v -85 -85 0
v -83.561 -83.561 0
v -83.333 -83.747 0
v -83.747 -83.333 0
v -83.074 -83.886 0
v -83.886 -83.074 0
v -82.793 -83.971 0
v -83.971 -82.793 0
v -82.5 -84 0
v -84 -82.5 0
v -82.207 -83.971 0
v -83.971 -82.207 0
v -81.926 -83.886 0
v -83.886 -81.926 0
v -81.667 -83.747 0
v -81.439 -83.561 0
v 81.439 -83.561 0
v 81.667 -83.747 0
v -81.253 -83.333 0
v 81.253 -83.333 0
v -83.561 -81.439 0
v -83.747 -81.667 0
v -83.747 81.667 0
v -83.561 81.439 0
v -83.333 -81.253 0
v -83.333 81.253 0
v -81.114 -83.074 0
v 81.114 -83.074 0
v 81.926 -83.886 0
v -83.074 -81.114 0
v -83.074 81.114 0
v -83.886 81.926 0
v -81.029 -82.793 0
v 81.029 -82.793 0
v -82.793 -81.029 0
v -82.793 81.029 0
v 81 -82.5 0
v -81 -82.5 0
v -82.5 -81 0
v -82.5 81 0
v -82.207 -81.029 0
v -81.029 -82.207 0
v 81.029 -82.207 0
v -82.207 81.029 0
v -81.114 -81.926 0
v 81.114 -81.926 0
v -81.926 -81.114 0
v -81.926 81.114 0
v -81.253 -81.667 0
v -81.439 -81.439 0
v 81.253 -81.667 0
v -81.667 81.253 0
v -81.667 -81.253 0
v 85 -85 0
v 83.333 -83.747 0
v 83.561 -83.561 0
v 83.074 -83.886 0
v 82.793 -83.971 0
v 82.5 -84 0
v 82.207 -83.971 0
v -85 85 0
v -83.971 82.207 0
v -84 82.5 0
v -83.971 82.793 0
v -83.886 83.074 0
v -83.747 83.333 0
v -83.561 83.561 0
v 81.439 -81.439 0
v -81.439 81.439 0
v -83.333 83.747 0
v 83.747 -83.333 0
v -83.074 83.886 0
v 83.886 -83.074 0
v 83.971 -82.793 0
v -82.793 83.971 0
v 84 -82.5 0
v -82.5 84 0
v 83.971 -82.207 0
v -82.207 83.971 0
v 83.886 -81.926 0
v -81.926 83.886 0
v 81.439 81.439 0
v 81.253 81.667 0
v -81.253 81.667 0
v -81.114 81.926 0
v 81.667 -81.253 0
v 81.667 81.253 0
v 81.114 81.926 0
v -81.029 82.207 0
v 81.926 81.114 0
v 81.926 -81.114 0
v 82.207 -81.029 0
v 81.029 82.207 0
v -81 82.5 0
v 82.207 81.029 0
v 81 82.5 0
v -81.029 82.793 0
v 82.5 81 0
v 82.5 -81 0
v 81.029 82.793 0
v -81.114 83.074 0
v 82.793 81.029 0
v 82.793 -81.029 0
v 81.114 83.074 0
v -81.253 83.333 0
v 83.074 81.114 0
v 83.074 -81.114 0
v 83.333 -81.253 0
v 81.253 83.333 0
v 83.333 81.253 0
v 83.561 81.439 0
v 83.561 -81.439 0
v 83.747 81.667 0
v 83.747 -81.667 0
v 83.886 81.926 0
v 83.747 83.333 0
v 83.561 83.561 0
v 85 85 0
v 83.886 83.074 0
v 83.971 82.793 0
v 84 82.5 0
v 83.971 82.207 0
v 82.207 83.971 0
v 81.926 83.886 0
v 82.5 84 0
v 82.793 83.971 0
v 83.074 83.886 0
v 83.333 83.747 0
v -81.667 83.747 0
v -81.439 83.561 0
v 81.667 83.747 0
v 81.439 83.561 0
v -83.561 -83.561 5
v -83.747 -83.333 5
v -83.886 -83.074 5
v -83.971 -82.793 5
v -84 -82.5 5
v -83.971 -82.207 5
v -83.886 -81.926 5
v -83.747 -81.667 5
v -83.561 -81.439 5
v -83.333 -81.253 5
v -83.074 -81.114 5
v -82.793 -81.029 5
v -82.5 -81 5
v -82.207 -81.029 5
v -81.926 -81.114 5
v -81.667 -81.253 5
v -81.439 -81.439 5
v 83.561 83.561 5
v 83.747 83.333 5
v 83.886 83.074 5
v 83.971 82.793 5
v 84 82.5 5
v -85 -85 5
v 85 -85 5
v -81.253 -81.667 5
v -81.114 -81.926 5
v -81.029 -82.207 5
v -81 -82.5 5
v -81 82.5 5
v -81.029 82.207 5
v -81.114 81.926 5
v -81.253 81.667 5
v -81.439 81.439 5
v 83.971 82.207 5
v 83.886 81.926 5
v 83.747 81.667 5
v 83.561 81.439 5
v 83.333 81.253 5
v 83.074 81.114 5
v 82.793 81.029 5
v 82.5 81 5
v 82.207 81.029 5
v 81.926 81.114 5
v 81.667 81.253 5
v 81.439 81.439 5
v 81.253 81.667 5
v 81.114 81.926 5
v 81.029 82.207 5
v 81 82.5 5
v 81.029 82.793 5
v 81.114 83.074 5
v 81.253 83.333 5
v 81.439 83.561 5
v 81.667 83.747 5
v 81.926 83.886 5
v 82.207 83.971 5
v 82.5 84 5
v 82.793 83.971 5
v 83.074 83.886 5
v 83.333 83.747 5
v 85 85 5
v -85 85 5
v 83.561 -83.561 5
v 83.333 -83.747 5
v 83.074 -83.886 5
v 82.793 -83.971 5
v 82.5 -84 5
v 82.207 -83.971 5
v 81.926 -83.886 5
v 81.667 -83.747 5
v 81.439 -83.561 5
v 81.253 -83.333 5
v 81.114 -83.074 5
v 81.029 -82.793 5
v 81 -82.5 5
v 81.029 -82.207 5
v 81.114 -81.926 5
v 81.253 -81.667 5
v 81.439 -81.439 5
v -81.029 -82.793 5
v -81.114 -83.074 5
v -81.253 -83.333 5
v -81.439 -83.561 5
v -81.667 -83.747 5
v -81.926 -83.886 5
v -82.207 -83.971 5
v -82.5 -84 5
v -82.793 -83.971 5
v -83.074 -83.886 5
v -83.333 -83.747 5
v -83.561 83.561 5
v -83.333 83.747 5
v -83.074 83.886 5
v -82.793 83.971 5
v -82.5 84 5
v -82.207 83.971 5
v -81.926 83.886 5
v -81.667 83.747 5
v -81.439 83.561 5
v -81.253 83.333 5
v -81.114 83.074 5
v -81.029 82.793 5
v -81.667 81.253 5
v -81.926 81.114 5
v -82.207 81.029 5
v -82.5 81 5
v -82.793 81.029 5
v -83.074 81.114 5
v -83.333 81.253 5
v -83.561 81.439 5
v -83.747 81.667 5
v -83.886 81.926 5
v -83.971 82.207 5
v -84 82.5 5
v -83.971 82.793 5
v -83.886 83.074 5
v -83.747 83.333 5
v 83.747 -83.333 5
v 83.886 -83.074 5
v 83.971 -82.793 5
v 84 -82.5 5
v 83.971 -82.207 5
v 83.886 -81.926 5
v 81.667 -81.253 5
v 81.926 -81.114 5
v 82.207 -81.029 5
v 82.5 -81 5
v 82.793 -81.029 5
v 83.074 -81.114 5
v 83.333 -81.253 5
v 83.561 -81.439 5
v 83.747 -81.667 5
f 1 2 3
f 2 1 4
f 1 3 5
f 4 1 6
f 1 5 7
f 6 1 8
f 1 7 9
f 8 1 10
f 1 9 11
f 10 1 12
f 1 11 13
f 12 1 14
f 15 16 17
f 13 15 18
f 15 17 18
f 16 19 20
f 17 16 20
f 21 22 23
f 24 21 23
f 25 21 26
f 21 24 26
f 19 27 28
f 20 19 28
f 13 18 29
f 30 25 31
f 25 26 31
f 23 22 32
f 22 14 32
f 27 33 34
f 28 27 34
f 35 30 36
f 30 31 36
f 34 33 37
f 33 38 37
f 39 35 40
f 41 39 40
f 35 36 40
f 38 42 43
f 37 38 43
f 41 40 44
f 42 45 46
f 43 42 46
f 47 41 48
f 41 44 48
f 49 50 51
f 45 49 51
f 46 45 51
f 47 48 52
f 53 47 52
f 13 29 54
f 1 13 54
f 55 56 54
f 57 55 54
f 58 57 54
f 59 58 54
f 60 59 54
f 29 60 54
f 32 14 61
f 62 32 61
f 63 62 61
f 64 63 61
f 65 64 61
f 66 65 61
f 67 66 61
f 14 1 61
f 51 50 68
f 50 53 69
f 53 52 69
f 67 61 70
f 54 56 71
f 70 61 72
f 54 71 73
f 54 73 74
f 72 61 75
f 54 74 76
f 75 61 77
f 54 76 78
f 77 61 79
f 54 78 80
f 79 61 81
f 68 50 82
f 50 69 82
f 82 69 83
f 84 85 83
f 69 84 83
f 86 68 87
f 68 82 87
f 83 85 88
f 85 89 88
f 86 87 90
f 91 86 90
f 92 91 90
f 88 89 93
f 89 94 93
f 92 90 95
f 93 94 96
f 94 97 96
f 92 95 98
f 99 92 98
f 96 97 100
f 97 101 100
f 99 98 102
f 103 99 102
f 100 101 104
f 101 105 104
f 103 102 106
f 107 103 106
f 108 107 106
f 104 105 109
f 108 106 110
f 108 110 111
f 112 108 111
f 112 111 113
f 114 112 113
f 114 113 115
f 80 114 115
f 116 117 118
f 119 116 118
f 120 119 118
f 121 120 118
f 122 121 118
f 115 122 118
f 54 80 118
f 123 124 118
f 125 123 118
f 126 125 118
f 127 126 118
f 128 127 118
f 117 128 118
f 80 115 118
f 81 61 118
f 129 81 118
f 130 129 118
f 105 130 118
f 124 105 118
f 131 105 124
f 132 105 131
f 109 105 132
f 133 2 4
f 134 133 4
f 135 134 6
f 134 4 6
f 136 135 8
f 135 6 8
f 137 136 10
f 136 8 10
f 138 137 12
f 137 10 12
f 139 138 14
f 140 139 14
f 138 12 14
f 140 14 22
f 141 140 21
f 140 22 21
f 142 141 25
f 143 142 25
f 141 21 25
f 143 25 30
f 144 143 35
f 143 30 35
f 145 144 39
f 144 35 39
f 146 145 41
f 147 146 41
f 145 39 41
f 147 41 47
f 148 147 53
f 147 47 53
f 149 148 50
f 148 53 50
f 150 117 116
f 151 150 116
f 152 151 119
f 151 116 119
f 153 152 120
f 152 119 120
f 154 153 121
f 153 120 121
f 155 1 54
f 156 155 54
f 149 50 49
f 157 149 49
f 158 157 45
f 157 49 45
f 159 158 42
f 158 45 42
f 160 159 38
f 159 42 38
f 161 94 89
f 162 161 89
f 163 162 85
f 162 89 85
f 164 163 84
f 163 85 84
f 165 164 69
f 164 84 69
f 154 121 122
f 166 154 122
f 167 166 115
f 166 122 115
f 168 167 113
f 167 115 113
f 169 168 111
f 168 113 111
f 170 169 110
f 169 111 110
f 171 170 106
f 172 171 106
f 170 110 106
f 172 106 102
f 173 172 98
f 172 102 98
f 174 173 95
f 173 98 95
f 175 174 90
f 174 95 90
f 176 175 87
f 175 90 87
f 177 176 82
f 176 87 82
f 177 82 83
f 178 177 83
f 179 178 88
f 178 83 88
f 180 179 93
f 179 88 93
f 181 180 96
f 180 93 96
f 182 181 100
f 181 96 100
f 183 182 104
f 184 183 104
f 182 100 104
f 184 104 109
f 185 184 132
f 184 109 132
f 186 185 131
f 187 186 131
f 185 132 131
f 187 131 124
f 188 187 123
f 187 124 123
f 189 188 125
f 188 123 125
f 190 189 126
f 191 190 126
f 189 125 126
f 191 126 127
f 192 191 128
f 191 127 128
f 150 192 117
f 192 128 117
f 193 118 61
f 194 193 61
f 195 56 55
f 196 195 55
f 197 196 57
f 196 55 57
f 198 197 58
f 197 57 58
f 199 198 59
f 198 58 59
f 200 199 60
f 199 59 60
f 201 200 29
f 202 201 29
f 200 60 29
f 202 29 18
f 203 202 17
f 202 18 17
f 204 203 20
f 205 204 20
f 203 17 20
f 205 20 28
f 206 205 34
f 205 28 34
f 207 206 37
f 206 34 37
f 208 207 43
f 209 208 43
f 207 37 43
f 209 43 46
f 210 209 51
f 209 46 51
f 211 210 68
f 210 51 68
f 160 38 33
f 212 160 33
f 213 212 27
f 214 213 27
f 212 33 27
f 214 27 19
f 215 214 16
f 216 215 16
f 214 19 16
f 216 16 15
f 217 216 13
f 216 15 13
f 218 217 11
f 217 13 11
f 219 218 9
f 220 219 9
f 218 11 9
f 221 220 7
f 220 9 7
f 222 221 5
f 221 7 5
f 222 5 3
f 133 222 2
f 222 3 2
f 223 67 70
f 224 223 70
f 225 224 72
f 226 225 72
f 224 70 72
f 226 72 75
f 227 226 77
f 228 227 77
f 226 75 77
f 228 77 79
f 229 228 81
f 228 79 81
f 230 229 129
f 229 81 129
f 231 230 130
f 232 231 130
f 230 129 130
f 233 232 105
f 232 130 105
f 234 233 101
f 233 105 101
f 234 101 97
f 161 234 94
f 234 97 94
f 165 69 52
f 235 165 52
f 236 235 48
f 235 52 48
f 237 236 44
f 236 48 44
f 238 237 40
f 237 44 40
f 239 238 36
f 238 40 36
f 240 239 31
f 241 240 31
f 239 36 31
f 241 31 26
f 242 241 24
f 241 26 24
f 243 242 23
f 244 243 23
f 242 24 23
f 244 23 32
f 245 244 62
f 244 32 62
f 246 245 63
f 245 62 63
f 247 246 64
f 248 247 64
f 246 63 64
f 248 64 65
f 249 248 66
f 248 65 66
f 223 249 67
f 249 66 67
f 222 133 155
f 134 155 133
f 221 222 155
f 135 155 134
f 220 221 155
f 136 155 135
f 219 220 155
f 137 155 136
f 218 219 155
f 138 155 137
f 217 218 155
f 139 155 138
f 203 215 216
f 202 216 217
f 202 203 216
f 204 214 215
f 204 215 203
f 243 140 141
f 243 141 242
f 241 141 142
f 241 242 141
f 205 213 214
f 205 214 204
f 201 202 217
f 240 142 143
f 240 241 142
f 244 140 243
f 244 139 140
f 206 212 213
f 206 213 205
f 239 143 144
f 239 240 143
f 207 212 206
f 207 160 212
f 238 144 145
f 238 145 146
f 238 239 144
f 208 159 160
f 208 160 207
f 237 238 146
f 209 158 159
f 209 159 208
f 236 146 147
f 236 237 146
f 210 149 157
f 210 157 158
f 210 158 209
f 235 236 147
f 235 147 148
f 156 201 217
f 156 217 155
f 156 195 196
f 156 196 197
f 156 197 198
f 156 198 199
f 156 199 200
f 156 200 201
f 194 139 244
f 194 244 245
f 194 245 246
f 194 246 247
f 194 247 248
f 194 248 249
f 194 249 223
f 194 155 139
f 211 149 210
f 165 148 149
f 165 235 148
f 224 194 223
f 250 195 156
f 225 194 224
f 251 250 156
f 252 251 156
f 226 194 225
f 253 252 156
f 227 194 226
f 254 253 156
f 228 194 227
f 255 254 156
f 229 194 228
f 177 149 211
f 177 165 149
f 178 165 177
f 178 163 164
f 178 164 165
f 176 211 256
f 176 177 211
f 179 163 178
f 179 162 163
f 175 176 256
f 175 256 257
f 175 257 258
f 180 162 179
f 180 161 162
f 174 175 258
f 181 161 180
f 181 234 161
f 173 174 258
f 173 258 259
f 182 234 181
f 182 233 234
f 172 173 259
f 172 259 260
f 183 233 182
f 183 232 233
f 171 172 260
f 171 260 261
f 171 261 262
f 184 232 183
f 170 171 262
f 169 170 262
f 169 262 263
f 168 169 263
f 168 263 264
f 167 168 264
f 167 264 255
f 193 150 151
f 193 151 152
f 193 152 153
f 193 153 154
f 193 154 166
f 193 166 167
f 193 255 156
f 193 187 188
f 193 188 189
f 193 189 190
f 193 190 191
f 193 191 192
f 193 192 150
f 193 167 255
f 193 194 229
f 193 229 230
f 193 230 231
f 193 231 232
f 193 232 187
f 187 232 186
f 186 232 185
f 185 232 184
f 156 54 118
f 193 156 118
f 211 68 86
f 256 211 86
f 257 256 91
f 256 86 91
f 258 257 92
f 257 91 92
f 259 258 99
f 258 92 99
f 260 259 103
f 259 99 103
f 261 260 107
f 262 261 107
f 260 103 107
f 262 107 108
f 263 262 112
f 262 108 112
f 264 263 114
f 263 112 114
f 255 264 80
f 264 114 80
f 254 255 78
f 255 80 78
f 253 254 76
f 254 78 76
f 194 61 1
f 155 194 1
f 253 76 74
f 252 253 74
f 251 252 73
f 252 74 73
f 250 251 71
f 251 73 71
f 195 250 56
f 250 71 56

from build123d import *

# Parameters (mm, degrees)
F0_W     = 160.000002
F0_H     = 160.000002
F1_DEPTH = 5


with BuildPart() as f1:
    # F0 (on Top) → F1 (new body)
    with BuildSketch(Plane.XY):
        with BuildLine():
            Line((-85, -85), (85, -85))
            Line((85, -85), (83.56066, -83.56066))
            ThreePointArc((83.56066, -83.56066), (81.43934, -83.56066), (81.43934, -81.43934))
            Line((81.43934, -81.43934), (80.000001, -80.000001))
            Line((80.000001, -80.000001), (-80.000001, -80.000001))
            Line((-80.000001, -80.000001), (-81.43934, -81.43934))
            ThreePointArc((-81.43934, -81.43934), (-81.114181, -81.925975), (-81, -82.5))
            ThreePointArc((-81, -82.5), (-81.925975, -83.88582), (-83.56066, -83.56066))
            Line((-83.56066, -83.56066), (-85, -85))
        make_face()
        with BuildLine():
            Line((-85, 85), (-85, -85))
            Line((-85, -85), (-83.56066, -83.56066))
            ThreePointArc((-83.56066, -83.56066), (-83.56066, -81.43934), (-81.43934, -81.43934))
            Line((-81.43934, -81.43934), (-80.000001, -80.000001))
            Line((-80.000001, -80.000001), (-80.000001, 80.000001))
            Line((-80.000001, 80.000001), (-81.43934, 81.43934))
            ThreePointArc((-81.43934, 81.43934), (-83.56066, 81.43934), (-83.56066, 83.56066))
            Line((-83.56066, 83.56066), (-85, 85))
        make_face()
        with BuildLine():
            Line((83.56066, -83.56066), (85, -85))
            Line((85, -85), (85, 85))
            Line((85, 85), (83.56066, 83.56066))
            ThreePointArc((83.56066, 83.56066), (83.88582, 83.074025), (84, 82.5))
            ThreePointArc((84, 82.5), (83.074025, 81.114181), (81.43934, 81.43934))
            Line((81.43934, 81.43934), (80.000001, 80.000001))
            Line((80.000001, 80.000001), (80.000001, -80.000001))
            Line((80.000001, -80.000001), (81.43934, -81.43934))
            ThreePointArc((81.43934, -81.43934), (83.074025, -81.114181), (84, -82.5))
            ThreePointArc((84, -82.5), (83.88582, -83.074025), (83.56066, -83.56066))
        make_face()
        with BuildLine():
            Line((83.56066, 83.56066), (85, 85))
            Line((85, 85), (-85, 85))
            Line((-85, 85), (-83.56066, 83.56066))
            ThreePointArc((-83.56066, 83.56066), (-81.925975, 83.88582), (-81, 82.5))
            ThreePointArc((-81, 82.5), (-81.114181, 81.925975), (-81.43934, 81.43934))
            Line((-81.43934, 81.43934), (-80.000001, 80.000001))
            Line((-80.000001, 80.000001), (80.000001, 80.000001))
            Line((80.000001, 80.000001), (81.43934, 81.43934))
            ThreePointArc((81.43934, 81.43934), (81.43934, 83.56066), (83.56066, 83.56066))
        make_face()
        Rectangle(F0_W, F0_H)
    extrude(amount=F1_DEPTH)


solid = f1.part
